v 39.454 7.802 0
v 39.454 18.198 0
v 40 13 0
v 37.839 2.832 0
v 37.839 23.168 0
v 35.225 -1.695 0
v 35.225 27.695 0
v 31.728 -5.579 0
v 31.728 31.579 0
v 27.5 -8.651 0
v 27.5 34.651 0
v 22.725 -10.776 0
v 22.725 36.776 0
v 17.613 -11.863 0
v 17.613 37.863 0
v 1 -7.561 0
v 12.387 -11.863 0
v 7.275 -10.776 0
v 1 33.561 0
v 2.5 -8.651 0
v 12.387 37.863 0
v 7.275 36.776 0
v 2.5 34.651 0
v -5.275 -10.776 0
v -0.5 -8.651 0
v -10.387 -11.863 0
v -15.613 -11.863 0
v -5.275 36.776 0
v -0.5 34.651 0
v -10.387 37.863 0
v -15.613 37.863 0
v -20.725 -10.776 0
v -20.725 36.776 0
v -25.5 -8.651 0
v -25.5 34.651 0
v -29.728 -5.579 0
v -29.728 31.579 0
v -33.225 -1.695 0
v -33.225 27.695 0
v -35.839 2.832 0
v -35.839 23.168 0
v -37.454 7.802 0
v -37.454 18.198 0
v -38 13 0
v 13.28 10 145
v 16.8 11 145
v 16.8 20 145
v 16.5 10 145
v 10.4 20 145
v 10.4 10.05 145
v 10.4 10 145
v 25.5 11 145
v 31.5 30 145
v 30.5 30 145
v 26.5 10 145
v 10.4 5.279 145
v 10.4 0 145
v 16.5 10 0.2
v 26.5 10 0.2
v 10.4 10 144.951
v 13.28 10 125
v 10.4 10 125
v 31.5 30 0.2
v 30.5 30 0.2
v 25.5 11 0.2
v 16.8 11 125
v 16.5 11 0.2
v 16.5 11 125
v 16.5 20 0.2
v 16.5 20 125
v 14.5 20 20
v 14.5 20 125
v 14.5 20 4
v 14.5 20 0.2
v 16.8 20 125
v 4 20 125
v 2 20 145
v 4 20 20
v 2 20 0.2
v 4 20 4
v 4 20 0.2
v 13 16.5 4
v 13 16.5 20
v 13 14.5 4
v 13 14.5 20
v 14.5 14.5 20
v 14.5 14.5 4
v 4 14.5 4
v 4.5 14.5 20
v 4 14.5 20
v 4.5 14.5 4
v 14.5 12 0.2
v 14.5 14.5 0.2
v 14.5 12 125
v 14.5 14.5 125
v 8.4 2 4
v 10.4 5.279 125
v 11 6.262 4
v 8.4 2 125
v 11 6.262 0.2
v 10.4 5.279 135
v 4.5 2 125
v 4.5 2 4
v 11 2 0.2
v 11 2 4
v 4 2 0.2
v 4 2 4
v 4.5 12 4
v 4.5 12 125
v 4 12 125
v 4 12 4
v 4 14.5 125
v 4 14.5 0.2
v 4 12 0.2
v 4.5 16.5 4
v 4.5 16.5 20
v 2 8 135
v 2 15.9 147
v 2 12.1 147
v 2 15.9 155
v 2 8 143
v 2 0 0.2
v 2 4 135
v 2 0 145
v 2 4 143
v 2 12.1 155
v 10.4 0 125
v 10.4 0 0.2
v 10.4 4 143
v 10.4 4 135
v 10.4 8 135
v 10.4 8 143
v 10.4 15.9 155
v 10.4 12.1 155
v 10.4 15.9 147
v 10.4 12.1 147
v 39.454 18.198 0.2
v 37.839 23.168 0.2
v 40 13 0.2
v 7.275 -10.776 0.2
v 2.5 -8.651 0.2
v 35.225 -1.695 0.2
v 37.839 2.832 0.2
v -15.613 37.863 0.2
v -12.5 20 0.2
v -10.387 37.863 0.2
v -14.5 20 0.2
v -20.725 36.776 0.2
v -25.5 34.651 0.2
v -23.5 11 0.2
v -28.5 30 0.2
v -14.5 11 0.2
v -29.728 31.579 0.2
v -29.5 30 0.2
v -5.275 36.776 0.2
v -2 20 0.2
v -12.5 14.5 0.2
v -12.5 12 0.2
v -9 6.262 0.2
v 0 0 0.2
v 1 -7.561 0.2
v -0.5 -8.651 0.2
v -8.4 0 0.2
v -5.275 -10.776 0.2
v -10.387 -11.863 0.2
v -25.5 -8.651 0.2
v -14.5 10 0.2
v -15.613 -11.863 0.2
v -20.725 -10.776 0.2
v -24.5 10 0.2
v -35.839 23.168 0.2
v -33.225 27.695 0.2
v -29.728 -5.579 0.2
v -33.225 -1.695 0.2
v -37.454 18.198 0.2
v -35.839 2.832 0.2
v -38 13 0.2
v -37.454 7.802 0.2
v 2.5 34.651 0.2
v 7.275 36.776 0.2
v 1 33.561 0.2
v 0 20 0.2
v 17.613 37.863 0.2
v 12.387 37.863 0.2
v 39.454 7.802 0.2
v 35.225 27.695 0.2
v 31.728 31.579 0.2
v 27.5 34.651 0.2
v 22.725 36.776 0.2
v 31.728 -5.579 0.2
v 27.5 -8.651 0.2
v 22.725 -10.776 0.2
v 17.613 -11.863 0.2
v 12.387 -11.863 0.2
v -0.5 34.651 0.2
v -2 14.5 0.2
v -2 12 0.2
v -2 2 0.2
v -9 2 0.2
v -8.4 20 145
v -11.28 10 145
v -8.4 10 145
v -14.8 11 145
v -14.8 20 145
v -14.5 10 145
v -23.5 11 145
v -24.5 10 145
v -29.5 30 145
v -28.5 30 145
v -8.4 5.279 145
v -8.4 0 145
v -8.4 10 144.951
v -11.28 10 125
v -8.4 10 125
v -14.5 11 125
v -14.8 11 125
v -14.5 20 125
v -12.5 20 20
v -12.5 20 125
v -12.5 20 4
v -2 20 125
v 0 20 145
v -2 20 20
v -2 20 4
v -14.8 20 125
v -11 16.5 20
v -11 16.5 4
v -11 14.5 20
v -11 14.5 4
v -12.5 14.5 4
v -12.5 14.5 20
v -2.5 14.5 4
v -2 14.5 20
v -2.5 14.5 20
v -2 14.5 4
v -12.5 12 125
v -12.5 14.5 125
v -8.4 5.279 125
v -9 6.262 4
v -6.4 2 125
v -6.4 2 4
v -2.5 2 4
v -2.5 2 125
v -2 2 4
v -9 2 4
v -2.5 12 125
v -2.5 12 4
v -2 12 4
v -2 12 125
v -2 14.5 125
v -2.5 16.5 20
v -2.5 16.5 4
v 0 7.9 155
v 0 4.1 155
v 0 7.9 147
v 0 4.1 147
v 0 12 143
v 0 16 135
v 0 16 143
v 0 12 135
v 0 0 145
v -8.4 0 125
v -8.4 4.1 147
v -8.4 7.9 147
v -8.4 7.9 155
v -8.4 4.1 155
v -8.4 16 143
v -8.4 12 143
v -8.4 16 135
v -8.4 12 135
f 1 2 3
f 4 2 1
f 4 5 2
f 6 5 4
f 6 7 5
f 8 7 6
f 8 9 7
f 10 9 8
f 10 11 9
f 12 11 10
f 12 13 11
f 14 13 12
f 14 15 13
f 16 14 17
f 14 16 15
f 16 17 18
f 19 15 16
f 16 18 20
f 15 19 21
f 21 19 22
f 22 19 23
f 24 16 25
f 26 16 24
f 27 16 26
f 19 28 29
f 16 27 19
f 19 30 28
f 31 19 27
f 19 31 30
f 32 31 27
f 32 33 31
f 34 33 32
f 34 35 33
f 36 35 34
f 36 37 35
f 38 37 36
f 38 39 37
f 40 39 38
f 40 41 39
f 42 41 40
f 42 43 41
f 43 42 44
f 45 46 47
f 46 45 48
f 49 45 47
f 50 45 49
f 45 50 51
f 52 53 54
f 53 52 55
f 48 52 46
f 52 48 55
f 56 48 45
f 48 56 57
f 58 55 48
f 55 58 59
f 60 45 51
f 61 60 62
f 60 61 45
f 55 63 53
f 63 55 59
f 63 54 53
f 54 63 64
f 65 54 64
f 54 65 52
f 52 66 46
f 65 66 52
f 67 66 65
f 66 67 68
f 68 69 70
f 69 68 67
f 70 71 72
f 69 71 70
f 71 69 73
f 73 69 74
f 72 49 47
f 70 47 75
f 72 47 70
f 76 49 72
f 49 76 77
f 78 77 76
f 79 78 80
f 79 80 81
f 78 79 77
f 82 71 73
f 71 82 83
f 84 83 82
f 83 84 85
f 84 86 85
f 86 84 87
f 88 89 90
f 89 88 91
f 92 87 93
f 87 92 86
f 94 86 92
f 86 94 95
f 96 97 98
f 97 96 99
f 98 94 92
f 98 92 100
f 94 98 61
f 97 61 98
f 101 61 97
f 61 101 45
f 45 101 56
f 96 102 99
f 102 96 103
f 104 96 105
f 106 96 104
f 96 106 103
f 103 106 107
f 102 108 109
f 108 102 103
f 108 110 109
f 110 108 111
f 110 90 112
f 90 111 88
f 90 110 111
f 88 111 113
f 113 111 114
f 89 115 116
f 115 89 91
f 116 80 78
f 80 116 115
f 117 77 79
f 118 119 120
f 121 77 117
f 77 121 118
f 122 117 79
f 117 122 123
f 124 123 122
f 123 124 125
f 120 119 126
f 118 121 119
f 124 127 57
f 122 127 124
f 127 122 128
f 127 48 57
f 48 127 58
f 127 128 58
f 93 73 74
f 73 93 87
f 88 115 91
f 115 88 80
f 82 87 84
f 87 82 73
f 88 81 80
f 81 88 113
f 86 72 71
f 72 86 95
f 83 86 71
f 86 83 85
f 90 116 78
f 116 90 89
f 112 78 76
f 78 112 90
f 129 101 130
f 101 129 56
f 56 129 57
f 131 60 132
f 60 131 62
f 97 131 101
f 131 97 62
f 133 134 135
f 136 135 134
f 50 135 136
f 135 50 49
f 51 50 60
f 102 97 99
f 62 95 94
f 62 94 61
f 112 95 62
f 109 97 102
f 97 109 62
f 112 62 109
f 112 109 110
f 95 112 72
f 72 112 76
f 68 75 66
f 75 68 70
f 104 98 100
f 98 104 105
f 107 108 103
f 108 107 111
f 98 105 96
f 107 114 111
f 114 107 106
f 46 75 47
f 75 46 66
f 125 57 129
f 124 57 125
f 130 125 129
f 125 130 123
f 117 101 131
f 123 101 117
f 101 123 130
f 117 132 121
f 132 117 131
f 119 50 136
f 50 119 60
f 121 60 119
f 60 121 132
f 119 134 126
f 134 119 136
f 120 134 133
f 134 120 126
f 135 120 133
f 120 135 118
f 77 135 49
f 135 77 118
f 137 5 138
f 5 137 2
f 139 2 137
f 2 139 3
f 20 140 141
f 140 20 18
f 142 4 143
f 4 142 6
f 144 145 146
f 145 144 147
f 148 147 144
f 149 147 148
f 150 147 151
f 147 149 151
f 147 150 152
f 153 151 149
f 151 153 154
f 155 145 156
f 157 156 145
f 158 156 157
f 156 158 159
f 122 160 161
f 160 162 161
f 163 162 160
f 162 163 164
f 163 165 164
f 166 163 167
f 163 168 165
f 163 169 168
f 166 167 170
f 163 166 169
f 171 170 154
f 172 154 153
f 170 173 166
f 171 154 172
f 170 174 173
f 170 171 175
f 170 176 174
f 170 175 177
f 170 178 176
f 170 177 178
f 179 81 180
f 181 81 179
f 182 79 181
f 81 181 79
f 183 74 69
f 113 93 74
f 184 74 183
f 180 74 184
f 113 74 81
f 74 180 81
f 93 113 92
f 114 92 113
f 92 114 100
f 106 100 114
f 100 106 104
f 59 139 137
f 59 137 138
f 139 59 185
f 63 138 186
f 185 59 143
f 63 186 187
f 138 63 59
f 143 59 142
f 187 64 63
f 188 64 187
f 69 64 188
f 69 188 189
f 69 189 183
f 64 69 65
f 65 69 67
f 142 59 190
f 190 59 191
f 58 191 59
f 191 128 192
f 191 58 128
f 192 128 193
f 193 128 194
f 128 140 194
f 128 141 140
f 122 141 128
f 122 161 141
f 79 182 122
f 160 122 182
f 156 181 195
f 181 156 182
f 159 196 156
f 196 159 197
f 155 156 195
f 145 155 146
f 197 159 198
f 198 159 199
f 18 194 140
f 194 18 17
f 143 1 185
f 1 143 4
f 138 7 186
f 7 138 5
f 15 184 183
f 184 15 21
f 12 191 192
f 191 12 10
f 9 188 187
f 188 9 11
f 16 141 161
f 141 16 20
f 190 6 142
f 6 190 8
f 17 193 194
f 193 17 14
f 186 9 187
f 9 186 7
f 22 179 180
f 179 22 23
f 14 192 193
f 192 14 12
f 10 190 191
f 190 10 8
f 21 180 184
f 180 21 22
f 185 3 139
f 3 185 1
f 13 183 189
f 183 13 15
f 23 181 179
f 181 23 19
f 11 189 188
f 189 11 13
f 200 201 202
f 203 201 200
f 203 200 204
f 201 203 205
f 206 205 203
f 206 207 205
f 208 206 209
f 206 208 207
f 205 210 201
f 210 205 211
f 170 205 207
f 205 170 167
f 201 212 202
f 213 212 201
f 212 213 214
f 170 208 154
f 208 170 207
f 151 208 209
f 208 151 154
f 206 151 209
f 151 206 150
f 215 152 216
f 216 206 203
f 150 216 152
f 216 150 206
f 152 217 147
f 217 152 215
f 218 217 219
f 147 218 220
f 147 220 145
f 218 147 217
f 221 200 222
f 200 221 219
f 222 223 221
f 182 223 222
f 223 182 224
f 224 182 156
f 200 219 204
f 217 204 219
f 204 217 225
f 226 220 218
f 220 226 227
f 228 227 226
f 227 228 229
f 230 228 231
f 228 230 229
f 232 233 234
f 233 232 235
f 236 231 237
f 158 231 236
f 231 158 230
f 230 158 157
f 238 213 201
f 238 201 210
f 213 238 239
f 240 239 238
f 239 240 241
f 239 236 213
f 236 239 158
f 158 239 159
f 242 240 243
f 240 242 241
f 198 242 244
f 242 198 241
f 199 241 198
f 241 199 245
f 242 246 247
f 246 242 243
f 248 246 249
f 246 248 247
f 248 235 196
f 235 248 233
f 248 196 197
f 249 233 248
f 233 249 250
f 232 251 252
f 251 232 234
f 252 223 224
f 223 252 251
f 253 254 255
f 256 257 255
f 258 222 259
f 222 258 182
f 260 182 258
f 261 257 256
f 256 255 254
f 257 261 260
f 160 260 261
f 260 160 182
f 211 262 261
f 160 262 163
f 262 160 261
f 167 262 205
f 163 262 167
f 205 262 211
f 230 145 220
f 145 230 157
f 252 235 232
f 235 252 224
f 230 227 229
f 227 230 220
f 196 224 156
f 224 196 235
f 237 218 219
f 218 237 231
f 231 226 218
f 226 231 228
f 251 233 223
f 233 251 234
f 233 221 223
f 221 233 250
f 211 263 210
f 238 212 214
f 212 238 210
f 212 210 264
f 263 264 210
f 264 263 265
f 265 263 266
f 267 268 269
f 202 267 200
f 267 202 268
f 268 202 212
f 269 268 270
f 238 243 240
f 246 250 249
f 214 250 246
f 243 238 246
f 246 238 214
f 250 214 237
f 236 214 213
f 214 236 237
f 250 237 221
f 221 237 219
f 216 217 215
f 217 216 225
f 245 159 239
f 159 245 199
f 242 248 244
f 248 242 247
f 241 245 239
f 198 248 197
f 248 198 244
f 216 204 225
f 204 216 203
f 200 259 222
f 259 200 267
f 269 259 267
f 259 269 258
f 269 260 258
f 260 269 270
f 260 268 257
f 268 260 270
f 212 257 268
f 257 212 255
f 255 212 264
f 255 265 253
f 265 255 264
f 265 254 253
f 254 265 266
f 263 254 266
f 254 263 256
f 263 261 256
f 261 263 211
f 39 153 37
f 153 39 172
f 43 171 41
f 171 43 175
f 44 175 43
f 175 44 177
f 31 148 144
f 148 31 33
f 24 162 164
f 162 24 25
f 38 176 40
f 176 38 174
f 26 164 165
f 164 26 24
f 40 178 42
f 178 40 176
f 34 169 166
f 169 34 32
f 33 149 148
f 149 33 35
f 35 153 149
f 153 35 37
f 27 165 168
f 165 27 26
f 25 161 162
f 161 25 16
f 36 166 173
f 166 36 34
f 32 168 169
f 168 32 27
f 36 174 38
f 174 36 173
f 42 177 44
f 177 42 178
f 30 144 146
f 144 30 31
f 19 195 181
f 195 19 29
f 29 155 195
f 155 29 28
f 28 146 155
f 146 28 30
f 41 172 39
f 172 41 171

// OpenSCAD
/*
              /
  h          /
  |     |   /
  |     |__/
  |    /
  |___/
     w1 w2 w_add_1
*/


h=20;
w1=8.4;
w2=14.5;

inner_right_w = w2-3.5;
inner_left_w = 2.5;

h_add_0=10;
h_add_1=h_add_0+20;
w_add_0=w2;
w_add_1=w2+10;
w_add_2=w_add_1+5;

clip_h=5.5;
clip_helper_h=clip_h-2;

connector_h=10;
connector_h_puffer=20;
connector_h_helper = 2;

thickness=2;
thickness_add=1;

print_h=145;

  
cut_out_h=4;
cut_out_h2=20;


complete();

module complete(){
  translate([2,0,0])complete_plus();
  complete_minus();
  //printhelper
}

module complete_minus(){
  mirror([1,0,0])union(){
    difference(){
      main();
      translate([0,0,print_h-connector_h_puffer]) cube([w1,h,connector_h_puffer]);
      translate([thickness,thickness,0]) cube([7,10,cut_out_h]);
    }
    connector_minus();
    translate([13,13,0]) linear_extrude(0.2)circle(r=25);
  }
}

module complete_plus(){
 difference(){
  main();
  translate([0,0,print_h-connector_h_puffer]) cube([w1,h,connector_h_puffer]);
  translate([thickness,thickness,0]) cube([7,10,cut_out_h]);
 }
 connector_plus();
 translate([13,13,0]) linear_extrude(0.2)circle(r=25);
}

module connector_minus(){ 
  connector_bridge();
  translate([0,0,print_h-connector_h_puffer]) rotate([90,0,90]) connector();
}

module connector_plus(){
  connector_bridge();
  translate([0,h,print_h-connector_h_puffer]) rotate([90,0,90]) mirror([1,0,0]) connector();
}

module connector_bridge(){
    translate([w1,h_add_0,print_h-connector_h_puffer]) cube([w1-thickness,h_add_0,connector_h_puffer]);
}

module connector(){
  tolerance=0.1;
  linear_extrude(w1) polygon (
  [[0,0]
    ,[0,connector_h_puffer]
    ,[1/5*h+tolerance,connector_h_puffer+connector_h_helper]
    ,[1/5*h+tolerance,connector_h_puffer+connector_h]
    ,[2/5*h-tolerance,connector_h_puffer+connector_h]
    ,[2/5*h-tolerance,connector_h_puffer+connector_h_helper]
    ,[3/5*h,connector_h_puffer-connector_h_helper]
    ,[3/5*h,connector_h_puffer-connector_h]
    ,[4/5*h,connector_h_puffer-connector_h]
    ,[4/5*h,connector_h_puffer-connector_h_helper]
    ,[h,connector_h_puffer]
    ,[h,0]
    ]);
  //translate([0,0,print_h-connector_h-connector_h_puffer]) cube([w1,h,connector_h_puffer]);
}

module main(){
 difference(){
  linear_extrude(print_h) polygon (
  [[0,0]
  ,[w1,0]
  ,[w2,h_add_0]

  //additional right
  ,[w_add_1,h_add_0]
  ,[w_add_2,h_add_1]
  ,[w_add_2-thickness_add,h_add_1]
  ,[w_add_1-thickness_add,h_add_0+thickness_add]
  ,[w_add_0,h_add_0+thickness_add]

  ,[w_add_0,h]
  ,[w_add_0-thickness,h]
  ,[inner_right_w,h-clip_helper_h]
  ,[inner_right_w,h-clip_h]
  ,[w2-thickness,h-clip_h]
  ,[w2-thickness,h_add_0+thickness]


  ,[w1-thickness,thickness]
  ,[inner_left_w,thickness]
  ,[inner_left_w,h_add_0+thickness]
  ,[thickness,h_add_0+thickness]
  ,[thickness,h-clip_h]
  ,[inner_left_w,h-clip_h]
  ,[inner_left_w,h-clip_helper_h]
  ,[thickness,h]
  ,[0,h]
  ]
  );

  
  translate([thickness,h-clip_h,0]) cube([w2-2*thickness,clip_h,cut_out_h]);
  translate([thickness,h-clip_h,cut_out_h2]) cube([w2-2*thickness,clip_h,print_h-cut_out_h2]);
  //translate([thickness,h-clip_h,0]) cube([w2-2*thickness,clip_h,print_h]);
}
}
